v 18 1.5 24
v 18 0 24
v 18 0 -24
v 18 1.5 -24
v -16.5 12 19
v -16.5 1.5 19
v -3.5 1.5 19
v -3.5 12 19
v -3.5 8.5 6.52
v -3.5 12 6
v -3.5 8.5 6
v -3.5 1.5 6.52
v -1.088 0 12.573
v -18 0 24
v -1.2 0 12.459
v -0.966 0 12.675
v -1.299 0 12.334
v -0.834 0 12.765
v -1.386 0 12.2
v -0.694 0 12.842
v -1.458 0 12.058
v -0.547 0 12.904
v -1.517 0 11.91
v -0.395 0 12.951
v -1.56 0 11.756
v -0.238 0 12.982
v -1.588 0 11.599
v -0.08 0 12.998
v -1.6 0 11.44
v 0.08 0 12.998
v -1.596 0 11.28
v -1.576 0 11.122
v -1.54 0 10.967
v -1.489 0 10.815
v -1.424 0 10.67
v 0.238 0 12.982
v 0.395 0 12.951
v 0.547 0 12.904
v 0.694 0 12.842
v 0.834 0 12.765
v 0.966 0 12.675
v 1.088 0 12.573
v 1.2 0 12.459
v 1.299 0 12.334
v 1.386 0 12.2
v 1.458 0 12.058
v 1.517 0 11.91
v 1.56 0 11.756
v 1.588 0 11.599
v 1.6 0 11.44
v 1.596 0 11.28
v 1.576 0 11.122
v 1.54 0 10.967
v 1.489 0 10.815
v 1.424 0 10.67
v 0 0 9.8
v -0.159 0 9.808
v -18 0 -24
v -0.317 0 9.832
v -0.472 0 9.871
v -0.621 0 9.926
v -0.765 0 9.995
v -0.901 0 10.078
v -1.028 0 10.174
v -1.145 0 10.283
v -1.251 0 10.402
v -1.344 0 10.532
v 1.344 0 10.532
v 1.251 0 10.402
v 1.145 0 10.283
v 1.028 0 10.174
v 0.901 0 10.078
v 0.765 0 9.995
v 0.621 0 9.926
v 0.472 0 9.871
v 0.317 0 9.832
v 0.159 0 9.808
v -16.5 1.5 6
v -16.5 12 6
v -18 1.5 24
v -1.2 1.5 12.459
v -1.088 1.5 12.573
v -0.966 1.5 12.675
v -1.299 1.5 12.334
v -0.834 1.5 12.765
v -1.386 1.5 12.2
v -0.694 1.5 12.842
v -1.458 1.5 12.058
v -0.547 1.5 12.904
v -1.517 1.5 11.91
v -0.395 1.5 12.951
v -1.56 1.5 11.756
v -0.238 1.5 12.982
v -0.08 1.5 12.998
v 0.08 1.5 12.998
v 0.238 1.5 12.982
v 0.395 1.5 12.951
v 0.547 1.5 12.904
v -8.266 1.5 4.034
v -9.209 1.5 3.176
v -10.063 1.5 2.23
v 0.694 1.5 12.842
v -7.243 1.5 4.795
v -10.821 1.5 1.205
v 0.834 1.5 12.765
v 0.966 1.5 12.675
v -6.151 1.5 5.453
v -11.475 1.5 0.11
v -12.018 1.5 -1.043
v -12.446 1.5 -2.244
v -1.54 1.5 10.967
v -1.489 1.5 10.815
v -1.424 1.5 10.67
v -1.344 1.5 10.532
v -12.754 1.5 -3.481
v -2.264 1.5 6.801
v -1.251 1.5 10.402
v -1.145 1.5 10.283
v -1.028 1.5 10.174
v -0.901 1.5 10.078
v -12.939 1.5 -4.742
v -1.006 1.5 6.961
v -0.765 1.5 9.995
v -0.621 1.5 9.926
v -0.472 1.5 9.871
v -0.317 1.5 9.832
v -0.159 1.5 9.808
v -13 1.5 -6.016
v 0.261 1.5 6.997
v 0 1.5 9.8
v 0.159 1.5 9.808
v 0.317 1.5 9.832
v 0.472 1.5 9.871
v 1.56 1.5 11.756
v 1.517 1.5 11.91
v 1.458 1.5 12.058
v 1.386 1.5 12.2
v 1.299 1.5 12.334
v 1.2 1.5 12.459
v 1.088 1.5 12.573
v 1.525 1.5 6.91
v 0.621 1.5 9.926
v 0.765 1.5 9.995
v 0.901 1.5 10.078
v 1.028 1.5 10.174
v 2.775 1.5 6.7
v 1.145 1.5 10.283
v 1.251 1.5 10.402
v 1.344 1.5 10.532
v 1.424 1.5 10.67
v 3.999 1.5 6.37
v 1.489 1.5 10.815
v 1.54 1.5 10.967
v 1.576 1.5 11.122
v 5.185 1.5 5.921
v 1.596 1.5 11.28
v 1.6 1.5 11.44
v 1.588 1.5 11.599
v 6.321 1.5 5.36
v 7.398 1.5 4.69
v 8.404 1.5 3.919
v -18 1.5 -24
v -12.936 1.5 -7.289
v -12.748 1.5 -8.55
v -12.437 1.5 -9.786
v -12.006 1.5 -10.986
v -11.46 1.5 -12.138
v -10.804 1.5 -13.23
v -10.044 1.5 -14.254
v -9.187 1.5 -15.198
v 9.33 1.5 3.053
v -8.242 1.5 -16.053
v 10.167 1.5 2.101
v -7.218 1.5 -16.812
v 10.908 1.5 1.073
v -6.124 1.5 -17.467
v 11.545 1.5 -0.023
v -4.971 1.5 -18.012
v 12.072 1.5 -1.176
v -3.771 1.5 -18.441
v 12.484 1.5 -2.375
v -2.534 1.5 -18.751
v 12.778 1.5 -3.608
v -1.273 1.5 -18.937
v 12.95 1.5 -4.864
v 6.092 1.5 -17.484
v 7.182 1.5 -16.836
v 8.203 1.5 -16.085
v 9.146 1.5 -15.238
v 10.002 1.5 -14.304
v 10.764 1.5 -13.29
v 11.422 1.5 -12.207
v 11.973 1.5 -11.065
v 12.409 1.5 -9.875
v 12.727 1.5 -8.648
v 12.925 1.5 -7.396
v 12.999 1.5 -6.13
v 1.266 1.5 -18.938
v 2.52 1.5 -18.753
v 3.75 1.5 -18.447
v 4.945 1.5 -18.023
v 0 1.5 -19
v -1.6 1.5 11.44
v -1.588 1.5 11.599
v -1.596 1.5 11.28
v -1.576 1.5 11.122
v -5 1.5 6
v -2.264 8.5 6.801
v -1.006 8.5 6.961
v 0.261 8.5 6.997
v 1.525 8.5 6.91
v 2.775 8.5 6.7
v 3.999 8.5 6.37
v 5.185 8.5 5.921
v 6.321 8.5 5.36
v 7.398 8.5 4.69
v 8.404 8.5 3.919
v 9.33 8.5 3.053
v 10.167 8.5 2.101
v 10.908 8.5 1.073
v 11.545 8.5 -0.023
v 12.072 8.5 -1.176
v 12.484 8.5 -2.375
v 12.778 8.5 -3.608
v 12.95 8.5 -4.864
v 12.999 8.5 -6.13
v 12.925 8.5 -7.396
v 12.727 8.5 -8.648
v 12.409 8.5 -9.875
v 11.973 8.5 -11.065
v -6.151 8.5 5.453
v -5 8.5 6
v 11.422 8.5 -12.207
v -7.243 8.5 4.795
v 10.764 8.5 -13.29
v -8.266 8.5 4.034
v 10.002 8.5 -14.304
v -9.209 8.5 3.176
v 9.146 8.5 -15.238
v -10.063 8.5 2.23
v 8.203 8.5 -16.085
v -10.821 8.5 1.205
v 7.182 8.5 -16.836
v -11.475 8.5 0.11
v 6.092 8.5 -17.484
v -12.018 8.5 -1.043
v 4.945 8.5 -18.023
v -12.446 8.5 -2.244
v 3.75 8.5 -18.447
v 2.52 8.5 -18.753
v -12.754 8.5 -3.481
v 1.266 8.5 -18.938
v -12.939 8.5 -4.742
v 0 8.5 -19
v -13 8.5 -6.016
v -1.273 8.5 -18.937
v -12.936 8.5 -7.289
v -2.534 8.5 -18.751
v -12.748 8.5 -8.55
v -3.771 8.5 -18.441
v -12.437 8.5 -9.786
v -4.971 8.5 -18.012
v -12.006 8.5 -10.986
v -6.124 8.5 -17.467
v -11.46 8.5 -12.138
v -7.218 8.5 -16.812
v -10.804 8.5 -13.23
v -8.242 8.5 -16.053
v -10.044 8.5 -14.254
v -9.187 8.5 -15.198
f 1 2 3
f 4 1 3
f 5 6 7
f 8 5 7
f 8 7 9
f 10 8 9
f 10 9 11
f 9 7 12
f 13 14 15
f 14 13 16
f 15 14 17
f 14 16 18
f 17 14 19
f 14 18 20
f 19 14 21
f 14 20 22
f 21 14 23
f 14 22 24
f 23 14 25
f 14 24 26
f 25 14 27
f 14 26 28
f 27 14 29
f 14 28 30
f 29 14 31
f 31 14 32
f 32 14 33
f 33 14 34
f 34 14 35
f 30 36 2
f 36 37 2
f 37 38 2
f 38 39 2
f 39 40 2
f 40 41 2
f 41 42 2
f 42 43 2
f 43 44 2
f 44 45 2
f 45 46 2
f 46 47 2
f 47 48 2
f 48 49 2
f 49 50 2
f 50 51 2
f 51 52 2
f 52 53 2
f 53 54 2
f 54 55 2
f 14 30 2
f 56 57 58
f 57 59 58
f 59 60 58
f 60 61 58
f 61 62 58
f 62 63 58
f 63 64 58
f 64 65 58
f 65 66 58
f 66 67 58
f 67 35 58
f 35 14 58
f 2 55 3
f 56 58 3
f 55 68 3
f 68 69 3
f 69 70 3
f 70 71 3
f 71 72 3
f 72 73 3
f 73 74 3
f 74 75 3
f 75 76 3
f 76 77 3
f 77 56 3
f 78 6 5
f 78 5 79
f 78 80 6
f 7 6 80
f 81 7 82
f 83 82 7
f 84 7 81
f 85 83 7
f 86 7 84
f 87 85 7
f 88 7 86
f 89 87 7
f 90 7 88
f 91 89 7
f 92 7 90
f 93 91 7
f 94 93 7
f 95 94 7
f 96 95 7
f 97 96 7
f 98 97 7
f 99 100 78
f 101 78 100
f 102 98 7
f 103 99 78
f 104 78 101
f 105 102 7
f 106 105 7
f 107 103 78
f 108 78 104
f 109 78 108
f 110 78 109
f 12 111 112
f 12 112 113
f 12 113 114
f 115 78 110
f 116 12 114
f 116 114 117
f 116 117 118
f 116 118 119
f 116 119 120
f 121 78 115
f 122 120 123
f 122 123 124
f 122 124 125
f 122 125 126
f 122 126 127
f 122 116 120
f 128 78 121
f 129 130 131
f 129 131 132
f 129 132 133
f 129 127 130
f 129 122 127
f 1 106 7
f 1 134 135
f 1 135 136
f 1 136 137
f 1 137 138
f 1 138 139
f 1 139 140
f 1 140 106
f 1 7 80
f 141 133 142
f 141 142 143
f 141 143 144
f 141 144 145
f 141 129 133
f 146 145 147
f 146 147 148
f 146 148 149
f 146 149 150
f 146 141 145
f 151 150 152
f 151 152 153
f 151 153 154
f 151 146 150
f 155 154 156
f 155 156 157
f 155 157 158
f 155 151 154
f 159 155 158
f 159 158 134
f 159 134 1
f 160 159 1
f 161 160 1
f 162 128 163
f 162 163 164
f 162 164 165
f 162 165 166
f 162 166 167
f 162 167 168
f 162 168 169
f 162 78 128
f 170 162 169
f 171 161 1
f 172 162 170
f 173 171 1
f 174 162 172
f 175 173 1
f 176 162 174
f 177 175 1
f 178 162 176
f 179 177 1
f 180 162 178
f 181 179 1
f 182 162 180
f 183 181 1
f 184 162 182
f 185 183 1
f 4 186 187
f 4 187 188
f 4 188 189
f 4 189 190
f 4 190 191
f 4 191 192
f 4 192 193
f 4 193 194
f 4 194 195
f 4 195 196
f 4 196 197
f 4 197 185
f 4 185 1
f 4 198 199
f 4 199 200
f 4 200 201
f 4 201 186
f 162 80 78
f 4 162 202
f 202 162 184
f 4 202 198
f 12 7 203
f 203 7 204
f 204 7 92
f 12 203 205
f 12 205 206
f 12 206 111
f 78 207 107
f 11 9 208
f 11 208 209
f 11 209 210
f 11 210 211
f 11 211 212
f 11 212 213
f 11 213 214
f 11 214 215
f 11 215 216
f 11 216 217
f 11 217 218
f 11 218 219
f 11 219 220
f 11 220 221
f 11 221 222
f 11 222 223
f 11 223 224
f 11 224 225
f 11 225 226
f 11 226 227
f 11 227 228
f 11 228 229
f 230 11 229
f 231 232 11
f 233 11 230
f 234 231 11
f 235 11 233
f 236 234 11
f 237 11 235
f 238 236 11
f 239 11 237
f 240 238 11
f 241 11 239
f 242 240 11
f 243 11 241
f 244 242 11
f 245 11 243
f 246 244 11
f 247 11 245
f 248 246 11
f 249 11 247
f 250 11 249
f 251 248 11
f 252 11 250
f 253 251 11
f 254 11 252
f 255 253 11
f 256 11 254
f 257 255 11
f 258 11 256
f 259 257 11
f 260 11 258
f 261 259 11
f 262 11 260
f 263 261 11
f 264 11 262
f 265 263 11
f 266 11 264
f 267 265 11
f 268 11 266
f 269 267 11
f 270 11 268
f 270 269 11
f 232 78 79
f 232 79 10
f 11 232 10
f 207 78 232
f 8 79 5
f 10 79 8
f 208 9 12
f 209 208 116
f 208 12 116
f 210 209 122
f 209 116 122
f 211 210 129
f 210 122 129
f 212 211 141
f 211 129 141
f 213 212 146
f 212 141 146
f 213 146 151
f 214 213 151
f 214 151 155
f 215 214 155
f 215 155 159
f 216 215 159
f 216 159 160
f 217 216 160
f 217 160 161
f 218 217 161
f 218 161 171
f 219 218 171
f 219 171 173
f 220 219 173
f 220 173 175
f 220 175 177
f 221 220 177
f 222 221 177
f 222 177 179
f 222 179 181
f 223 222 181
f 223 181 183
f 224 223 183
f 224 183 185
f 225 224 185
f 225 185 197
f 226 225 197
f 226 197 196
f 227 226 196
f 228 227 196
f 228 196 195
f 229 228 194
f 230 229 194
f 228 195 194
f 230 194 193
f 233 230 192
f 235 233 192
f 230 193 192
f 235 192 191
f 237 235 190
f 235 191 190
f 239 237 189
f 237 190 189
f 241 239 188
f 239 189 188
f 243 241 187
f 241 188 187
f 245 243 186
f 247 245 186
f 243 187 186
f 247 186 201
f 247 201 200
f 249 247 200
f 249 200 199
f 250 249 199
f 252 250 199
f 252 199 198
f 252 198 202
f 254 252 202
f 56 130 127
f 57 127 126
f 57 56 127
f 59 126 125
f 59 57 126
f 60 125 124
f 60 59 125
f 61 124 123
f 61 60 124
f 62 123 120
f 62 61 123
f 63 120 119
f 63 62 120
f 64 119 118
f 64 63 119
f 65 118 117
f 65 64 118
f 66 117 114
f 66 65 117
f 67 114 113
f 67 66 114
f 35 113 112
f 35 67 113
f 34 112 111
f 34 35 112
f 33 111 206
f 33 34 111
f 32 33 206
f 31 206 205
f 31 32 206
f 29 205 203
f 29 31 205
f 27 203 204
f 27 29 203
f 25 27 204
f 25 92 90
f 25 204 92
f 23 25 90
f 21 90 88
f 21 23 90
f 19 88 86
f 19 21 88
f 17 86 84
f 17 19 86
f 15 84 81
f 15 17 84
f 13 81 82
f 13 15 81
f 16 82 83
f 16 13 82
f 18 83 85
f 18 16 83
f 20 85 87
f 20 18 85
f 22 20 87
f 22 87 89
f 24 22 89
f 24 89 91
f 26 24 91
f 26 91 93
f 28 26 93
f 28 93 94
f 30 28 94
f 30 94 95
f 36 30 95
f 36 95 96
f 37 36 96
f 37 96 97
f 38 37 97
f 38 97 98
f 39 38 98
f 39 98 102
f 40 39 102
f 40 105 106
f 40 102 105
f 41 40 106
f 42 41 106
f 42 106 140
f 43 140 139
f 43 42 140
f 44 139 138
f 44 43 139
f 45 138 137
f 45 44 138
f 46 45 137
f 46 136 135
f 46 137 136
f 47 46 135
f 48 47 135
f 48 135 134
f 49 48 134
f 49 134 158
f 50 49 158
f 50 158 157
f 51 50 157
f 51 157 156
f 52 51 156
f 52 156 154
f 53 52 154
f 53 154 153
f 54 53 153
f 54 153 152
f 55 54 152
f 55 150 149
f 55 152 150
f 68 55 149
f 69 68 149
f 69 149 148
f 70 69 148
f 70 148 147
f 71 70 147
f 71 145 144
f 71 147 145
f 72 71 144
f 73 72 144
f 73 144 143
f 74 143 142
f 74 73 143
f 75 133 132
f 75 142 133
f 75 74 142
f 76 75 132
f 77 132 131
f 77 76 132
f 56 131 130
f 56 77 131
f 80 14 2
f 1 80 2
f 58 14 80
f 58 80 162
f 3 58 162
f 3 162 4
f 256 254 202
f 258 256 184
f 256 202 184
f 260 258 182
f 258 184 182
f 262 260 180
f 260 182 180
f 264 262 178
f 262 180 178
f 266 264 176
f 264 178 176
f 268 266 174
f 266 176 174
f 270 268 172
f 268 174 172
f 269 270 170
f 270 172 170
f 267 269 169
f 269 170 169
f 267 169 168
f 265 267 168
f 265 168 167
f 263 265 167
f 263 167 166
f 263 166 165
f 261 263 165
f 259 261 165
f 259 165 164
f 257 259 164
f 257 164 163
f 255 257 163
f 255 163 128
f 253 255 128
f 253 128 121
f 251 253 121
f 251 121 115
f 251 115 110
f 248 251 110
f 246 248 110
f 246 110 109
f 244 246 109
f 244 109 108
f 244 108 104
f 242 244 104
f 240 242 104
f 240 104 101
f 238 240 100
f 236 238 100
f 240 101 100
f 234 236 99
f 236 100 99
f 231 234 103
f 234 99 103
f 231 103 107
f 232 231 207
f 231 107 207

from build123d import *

# Parameters (mm, degrees)
SKETCH1_W           = 36
SKETCH1_H           = 48
BOSS_EXTRUDE1_DEPTH = 1.5
SKETCH1_3_R         = 13
BOSS_EXTRUDE2_DEPTH = 8.5
SKETCH1_4_W         = 13
SKETCH1_4_H         = 13
BOSS_EXTRUDE3_DEPTH = 12
SKETCH1_5_R         = 1.6
CUT_EXTRUDE2_DEPTH  = 33.310988843


with BuildPart() as part:
    # Sketch1 → Boss-Extrude1 (new body)
    with BuildSketch(Plane(origin=(0, 0, 0), x_dir=(1, 0, 0), z_dir=(0, 1, 0))):
        Rectangle(SKETCH1_W, SKETCH1_H)
    extrude(amount=BOSS_EXTRUDE1_DEPTH)

    # Sketch1<3> → Boss-Extrude2 (add)
    with BuildSketch(Plane(origin=(0, 0, 0), x_dir=(1, 0, 0), z_dir=(0, 1, 0))):
        with Locations((0, 6)):
            Circle(SKETCH1_3_R)
    extrude(amount=BOSS_EXTRUDE2_DEPTH)

    # Sketch1<4> → Boss-Extrude3 (add)
    with BuildSketch(Plane(origin=(0, 0, 0), x_dir=(1, 0, 0), z_dir=(0, 1, 0))):
        with Locations((-10, -12.5)):
            Rectangle(SKETCH1_4_W, SKETCH1_4_H)
    extrude(amount=BOSS_EXTRUDE3_DEPTH)

    # Sketch1<5> → Cut-Extrude2 (cut, through all)
    with BuildSketch(Plane(origin=(0, 0, 0), x_dir=(1, 0, 0), z_dir=(0, 1, 0))):
        with Locations((0, -11.4)):
            Circle(SKETCH1_5_R)
    extrude(amount=CUT_EXTRUDE2_DEPTH, mode=Mode.SUBTRACT)


solid = part.part
